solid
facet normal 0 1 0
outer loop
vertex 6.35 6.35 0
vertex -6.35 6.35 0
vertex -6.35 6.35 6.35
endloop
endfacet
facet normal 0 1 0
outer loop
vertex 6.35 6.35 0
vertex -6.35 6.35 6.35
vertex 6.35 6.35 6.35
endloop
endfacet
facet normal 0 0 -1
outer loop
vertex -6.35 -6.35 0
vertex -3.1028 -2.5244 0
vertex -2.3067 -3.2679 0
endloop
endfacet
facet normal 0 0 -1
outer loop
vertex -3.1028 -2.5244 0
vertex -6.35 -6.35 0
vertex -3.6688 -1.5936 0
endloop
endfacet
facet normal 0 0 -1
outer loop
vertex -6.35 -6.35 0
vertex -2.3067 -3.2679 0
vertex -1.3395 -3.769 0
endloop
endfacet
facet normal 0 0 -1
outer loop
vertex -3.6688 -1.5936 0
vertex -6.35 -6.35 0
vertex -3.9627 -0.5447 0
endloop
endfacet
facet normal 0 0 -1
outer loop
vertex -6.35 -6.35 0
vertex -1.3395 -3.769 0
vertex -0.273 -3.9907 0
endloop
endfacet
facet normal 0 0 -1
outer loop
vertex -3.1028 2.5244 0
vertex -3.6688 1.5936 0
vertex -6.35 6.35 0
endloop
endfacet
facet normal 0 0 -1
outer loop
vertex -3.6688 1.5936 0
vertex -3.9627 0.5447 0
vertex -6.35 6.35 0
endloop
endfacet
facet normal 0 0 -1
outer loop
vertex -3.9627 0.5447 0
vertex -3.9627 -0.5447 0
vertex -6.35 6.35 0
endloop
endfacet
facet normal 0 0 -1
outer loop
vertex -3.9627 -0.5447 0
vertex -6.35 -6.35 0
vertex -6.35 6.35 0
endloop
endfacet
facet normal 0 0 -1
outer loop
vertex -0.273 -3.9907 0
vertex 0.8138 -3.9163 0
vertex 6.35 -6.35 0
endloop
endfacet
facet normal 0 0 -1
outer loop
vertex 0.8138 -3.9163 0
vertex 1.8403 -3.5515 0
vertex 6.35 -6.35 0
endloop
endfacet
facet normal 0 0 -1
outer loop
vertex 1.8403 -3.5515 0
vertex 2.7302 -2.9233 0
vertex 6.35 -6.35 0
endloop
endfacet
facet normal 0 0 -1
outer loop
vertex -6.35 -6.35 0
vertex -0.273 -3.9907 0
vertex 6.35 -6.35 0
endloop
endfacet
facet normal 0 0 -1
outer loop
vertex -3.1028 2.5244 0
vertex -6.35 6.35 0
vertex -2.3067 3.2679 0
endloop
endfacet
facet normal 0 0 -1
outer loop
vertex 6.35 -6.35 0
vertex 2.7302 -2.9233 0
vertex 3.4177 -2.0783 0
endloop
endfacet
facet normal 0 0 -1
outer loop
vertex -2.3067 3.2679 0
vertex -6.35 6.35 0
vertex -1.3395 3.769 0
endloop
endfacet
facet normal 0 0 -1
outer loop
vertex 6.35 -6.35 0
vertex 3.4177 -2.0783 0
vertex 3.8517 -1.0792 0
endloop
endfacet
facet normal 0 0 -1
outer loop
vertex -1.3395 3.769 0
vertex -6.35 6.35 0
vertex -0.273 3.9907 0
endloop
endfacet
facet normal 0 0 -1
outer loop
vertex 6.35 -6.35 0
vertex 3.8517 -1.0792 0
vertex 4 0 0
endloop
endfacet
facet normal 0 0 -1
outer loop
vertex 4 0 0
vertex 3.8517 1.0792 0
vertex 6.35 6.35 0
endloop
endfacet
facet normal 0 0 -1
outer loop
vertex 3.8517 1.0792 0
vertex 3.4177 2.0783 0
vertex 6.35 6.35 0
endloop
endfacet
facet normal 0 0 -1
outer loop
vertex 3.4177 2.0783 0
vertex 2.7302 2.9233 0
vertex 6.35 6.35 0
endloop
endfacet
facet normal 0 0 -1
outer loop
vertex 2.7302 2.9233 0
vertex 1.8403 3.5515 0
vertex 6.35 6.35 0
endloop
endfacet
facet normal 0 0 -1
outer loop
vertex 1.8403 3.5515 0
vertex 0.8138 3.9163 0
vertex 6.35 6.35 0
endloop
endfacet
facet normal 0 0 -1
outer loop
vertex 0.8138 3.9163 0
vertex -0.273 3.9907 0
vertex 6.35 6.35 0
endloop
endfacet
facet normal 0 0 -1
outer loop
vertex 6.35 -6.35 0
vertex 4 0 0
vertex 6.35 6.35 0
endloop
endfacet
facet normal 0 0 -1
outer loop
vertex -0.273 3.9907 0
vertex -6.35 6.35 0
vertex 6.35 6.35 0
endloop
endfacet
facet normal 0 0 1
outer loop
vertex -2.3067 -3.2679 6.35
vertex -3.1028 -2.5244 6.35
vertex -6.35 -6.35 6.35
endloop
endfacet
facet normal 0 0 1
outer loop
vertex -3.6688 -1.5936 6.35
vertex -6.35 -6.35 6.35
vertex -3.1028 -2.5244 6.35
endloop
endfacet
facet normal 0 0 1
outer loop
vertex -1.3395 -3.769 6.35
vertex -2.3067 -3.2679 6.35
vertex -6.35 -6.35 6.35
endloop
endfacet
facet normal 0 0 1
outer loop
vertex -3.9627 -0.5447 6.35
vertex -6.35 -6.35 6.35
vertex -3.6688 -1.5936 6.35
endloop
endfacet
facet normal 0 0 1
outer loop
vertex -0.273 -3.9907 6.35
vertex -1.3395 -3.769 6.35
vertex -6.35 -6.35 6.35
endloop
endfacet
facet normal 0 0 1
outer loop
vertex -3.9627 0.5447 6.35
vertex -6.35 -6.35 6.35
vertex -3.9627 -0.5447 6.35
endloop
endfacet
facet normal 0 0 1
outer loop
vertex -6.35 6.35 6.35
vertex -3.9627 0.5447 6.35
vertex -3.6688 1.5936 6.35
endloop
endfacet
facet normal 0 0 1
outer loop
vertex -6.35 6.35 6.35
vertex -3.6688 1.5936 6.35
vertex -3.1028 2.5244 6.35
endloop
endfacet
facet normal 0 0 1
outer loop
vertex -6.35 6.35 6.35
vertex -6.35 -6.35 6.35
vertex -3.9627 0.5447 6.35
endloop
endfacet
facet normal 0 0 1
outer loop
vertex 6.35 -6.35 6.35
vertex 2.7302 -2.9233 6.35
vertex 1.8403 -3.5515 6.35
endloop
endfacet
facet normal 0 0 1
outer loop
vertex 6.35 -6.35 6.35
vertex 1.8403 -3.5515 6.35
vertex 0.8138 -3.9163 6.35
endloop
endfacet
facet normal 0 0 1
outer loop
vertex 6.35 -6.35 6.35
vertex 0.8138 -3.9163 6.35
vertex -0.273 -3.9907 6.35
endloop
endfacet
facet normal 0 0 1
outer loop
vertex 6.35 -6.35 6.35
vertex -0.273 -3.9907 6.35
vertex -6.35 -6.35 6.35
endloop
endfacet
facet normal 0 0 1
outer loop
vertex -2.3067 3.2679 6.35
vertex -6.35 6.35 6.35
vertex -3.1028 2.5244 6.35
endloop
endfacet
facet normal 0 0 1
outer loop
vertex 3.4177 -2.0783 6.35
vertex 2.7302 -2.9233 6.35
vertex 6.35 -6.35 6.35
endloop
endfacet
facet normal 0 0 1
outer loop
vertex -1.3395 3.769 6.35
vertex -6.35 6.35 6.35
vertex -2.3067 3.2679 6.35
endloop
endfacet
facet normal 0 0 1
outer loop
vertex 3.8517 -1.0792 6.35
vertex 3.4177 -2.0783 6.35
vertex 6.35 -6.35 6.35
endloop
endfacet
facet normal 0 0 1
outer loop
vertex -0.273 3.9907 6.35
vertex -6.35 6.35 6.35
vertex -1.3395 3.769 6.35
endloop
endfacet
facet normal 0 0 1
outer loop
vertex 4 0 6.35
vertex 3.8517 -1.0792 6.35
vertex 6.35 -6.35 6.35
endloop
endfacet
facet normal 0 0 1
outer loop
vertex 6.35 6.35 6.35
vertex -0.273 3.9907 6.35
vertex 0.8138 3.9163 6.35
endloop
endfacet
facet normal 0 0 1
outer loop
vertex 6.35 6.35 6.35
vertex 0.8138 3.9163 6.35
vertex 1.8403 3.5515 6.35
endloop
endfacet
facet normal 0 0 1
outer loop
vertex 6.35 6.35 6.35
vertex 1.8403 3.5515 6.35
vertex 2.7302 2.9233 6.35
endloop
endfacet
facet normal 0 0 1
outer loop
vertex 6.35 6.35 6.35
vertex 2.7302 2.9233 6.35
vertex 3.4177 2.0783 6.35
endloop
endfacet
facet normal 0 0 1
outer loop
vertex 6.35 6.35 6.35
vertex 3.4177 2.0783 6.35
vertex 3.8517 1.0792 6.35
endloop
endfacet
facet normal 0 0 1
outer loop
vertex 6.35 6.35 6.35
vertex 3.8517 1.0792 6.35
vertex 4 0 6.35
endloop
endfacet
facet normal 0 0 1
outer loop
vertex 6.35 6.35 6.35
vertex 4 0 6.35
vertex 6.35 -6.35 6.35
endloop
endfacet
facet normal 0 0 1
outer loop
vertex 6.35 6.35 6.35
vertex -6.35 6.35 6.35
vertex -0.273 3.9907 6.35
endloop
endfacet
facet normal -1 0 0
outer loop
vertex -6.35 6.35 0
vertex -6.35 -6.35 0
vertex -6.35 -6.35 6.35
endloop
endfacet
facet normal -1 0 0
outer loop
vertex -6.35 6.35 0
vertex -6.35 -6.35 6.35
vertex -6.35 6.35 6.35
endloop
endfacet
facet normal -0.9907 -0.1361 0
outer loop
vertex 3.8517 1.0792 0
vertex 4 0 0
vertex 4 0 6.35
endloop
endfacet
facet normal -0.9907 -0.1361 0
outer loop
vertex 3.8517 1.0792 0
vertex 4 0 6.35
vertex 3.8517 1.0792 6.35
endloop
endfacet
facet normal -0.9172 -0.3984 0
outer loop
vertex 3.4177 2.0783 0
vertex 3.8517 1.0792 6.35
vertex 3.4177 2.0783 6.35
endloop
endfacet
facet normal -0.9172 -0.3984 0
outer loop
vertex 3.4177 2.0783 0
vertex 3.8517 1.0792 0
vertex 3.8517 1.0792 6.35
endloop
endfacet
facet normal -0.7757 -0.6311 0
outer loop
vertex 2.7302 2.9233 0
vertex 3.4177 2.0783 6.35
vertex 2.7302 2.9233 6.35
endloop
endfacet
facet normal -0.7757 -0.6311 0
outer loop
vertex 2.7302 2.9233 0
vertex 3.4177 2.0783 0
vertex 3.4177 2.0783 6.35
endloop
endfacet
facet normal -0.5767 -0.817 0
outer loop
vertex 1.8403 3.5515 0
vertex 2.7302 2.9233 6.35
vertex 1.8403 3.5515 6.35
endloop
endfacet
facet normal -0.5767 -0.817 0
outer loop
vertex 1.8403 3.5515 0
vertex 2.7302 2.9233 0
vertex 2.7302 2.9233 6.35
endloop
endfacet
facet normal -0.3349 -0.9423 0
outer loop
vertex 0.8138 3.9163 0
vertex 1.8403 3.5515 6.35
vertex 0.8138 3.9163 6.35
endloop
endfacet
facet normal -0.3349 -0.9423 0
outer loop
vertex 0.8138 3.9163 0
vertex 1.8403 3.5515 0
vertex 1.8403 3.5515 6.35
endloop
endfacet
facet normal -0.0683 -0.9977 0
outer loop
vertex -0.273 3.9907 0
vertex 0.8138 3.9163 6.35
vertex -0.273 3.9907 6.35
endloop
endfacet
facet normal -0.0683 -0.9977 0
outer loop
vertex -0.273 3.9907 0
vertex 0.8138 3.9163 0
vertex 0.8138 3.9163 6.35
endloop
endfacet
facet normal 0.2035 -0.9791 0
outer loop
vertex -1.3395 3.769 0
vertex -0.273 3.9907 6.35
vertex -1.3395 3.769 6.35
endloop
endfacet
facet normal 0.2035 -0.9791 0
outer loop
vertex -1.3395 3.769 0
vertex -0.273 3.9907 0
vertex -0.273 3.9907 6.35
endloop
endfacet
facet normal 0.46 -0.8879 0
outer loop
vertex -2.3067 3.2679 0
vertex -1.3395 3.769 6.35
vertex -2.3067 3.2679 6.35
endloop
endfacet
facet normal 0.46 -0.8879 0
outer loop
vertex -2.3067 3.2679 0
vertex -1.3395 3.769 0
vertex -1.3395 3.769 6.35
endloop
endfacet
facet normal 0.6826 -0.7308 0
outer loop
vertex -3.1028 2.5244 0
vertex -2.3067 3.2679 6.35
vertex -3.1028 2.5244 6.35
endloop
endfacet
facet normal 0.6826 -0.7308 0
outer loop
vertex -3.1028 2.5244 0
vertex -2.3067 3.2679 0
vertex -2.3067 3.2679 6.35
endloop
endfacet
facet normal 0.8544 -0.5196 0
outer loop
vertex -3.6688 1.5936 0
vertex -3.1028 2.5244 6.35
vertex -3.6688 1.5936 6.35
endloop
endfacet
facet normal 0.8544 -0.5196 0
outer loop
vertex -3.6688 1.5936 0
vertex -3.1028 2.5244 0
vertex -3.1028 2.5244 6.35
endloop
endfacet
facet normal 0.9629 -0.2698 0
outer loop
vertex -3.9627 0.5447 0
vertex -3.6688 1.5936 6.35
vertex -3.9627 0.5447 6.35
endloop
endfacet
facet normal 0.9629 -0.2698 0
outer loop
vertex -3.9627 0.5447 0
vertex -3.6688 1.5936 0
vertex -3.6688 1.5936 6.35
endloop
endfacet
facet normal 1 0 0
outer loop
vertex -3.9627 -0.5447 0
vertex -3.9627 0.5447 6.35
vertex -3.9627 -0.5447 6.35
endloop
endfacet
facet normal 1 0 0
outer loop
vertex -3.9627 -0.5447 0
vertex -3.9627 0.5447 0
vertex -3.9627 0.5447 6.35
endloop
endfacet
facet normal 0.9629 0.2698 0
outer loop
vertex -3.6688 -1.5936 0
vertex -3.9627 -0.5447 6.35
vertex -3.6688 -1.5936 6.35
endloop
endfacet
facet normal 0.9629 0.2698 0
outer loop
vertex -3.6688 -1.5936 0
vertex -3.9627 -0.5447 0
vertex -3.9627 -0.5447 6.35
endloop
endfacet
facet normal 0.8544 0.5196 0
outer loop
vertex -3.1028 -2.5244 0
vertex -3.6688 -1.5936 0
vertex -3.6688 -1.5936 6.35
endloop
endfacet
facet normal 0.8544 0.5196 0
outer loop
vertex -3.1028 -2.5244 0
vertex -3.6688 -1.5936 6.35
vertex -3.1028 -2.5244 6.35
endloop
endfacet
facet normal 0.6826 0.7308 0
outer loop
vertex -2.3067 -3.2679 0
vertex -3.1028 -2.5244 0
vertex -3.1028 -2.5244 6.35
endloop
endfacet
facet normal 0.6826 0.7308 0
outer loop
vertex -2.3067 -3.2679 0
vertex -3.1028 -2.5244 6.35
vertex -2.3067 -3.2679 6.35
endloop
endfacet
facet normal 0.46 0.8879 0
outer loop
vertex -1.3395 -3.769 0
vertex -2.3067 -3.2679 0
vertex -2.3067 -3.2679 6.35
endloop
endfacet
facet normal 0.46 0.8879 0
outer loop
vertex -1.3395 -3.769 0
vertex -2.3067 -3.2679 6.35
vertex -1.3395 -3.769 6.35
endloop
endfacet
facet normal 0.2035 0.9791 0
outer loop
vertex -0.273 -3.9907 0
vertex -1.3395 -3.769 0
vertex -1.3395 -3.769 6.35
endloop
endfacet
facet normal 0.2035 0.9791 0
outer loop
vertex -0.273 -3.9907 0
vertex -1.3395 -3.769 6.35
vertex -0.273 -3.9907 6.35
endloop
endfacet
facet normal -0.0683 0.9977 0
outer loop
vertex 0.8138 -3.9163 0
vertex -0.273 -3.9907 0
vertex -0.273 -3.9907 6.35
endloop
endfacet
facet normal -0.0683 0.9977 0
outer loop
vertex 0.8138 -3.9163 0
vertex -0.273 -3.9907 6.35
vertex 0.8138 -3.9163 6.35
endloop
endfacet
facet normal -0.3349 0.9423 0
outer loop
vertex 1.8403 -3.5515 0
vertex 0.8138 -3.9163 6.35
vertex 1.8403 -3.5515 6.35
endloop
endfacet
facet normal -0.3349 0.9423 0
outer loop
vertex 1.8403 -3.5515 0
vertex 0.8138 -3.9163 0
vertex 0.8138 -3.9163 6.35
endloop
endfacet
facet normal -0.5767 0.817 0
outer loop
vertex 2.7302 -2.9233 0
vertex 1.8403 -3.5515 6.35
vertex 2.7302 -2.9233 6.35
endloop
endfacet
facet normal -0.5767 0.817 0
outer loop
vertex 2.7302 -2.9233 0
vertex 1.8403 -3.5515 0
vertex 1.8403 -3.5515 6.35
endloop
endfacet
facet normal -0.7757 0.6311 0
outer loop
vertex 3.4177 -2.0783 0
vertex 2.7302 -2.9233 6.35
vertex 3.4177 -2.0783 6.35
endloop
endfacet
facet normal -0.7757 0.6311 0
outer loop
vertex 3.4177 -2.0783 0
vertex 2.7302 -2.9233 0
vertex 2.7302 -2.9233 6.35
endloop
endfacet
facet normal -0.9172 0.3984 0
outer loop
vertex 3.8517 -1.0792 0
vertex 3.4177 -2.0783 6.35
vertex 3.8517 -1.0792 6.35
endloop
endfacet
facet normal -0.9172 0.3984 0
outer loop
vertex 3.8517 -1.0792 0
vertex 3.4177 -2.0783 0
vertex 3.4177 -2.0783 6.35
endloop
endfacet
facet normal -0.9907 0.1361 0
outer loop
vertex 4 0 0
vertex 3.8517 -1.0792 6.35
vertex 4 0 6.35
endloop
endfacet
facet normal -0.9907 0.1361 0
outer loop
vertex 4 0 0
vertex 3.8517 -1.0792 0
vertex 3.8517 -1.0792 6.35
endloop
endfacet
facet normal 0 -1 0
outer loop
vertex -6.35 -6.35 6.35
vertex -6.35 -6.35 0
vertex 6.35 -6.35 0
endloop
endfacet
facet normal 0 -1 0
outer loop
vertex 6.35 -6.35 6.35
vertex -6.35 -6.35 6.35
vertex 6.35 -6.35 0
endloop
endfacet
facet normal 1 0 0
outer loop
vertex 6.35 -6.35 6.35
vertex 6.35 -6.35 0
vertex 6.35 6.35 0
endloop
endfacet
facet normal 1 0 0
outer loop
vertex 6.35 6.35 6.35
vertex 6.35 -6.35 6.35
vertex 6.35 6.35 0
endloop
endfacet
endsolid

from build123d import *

# Parameters (mm, degrees)
CYLINDER035_R     = 4
CYLINDER035_DEPTH = 10
BOX014_W          = 12.7
BOX014_H          = 12.7
BOX014_DEPTH      = 6.35


with BuildPart() as cylinder035:
    # Cylinder035 → Cylinder035 (new body)
    with BuildSketch(Plane(origin=(6.35, 6.35, 0), x_dir=(1, 0, 0), z_dir=(0, 0, 1))):
        Circle(CYLINDER035_R)
    extrude(amount=CYLINDER035_DEPTH)


with BuildPart() as m8_nut001:
    # Box014 → Box014 (new body)
    with BuildSketch(Plane.XY):
        with Locations((6.35, 6.35)):
            Rectangle(BOX014_W, BOX014_H)
    extrude(amount=BOX014_DEPTH)

    # Cut012: cut Cylinder035
    add(cylinder035.part, mode=Mode.SUBTRACT)


with BuildPart() as m8_nut001_1:
    # Cut012 placement: moved
    add(m8_nut001.part.moved(Location((-6.35, -6.35, 0))))


solid = m8_nut001_1.part
